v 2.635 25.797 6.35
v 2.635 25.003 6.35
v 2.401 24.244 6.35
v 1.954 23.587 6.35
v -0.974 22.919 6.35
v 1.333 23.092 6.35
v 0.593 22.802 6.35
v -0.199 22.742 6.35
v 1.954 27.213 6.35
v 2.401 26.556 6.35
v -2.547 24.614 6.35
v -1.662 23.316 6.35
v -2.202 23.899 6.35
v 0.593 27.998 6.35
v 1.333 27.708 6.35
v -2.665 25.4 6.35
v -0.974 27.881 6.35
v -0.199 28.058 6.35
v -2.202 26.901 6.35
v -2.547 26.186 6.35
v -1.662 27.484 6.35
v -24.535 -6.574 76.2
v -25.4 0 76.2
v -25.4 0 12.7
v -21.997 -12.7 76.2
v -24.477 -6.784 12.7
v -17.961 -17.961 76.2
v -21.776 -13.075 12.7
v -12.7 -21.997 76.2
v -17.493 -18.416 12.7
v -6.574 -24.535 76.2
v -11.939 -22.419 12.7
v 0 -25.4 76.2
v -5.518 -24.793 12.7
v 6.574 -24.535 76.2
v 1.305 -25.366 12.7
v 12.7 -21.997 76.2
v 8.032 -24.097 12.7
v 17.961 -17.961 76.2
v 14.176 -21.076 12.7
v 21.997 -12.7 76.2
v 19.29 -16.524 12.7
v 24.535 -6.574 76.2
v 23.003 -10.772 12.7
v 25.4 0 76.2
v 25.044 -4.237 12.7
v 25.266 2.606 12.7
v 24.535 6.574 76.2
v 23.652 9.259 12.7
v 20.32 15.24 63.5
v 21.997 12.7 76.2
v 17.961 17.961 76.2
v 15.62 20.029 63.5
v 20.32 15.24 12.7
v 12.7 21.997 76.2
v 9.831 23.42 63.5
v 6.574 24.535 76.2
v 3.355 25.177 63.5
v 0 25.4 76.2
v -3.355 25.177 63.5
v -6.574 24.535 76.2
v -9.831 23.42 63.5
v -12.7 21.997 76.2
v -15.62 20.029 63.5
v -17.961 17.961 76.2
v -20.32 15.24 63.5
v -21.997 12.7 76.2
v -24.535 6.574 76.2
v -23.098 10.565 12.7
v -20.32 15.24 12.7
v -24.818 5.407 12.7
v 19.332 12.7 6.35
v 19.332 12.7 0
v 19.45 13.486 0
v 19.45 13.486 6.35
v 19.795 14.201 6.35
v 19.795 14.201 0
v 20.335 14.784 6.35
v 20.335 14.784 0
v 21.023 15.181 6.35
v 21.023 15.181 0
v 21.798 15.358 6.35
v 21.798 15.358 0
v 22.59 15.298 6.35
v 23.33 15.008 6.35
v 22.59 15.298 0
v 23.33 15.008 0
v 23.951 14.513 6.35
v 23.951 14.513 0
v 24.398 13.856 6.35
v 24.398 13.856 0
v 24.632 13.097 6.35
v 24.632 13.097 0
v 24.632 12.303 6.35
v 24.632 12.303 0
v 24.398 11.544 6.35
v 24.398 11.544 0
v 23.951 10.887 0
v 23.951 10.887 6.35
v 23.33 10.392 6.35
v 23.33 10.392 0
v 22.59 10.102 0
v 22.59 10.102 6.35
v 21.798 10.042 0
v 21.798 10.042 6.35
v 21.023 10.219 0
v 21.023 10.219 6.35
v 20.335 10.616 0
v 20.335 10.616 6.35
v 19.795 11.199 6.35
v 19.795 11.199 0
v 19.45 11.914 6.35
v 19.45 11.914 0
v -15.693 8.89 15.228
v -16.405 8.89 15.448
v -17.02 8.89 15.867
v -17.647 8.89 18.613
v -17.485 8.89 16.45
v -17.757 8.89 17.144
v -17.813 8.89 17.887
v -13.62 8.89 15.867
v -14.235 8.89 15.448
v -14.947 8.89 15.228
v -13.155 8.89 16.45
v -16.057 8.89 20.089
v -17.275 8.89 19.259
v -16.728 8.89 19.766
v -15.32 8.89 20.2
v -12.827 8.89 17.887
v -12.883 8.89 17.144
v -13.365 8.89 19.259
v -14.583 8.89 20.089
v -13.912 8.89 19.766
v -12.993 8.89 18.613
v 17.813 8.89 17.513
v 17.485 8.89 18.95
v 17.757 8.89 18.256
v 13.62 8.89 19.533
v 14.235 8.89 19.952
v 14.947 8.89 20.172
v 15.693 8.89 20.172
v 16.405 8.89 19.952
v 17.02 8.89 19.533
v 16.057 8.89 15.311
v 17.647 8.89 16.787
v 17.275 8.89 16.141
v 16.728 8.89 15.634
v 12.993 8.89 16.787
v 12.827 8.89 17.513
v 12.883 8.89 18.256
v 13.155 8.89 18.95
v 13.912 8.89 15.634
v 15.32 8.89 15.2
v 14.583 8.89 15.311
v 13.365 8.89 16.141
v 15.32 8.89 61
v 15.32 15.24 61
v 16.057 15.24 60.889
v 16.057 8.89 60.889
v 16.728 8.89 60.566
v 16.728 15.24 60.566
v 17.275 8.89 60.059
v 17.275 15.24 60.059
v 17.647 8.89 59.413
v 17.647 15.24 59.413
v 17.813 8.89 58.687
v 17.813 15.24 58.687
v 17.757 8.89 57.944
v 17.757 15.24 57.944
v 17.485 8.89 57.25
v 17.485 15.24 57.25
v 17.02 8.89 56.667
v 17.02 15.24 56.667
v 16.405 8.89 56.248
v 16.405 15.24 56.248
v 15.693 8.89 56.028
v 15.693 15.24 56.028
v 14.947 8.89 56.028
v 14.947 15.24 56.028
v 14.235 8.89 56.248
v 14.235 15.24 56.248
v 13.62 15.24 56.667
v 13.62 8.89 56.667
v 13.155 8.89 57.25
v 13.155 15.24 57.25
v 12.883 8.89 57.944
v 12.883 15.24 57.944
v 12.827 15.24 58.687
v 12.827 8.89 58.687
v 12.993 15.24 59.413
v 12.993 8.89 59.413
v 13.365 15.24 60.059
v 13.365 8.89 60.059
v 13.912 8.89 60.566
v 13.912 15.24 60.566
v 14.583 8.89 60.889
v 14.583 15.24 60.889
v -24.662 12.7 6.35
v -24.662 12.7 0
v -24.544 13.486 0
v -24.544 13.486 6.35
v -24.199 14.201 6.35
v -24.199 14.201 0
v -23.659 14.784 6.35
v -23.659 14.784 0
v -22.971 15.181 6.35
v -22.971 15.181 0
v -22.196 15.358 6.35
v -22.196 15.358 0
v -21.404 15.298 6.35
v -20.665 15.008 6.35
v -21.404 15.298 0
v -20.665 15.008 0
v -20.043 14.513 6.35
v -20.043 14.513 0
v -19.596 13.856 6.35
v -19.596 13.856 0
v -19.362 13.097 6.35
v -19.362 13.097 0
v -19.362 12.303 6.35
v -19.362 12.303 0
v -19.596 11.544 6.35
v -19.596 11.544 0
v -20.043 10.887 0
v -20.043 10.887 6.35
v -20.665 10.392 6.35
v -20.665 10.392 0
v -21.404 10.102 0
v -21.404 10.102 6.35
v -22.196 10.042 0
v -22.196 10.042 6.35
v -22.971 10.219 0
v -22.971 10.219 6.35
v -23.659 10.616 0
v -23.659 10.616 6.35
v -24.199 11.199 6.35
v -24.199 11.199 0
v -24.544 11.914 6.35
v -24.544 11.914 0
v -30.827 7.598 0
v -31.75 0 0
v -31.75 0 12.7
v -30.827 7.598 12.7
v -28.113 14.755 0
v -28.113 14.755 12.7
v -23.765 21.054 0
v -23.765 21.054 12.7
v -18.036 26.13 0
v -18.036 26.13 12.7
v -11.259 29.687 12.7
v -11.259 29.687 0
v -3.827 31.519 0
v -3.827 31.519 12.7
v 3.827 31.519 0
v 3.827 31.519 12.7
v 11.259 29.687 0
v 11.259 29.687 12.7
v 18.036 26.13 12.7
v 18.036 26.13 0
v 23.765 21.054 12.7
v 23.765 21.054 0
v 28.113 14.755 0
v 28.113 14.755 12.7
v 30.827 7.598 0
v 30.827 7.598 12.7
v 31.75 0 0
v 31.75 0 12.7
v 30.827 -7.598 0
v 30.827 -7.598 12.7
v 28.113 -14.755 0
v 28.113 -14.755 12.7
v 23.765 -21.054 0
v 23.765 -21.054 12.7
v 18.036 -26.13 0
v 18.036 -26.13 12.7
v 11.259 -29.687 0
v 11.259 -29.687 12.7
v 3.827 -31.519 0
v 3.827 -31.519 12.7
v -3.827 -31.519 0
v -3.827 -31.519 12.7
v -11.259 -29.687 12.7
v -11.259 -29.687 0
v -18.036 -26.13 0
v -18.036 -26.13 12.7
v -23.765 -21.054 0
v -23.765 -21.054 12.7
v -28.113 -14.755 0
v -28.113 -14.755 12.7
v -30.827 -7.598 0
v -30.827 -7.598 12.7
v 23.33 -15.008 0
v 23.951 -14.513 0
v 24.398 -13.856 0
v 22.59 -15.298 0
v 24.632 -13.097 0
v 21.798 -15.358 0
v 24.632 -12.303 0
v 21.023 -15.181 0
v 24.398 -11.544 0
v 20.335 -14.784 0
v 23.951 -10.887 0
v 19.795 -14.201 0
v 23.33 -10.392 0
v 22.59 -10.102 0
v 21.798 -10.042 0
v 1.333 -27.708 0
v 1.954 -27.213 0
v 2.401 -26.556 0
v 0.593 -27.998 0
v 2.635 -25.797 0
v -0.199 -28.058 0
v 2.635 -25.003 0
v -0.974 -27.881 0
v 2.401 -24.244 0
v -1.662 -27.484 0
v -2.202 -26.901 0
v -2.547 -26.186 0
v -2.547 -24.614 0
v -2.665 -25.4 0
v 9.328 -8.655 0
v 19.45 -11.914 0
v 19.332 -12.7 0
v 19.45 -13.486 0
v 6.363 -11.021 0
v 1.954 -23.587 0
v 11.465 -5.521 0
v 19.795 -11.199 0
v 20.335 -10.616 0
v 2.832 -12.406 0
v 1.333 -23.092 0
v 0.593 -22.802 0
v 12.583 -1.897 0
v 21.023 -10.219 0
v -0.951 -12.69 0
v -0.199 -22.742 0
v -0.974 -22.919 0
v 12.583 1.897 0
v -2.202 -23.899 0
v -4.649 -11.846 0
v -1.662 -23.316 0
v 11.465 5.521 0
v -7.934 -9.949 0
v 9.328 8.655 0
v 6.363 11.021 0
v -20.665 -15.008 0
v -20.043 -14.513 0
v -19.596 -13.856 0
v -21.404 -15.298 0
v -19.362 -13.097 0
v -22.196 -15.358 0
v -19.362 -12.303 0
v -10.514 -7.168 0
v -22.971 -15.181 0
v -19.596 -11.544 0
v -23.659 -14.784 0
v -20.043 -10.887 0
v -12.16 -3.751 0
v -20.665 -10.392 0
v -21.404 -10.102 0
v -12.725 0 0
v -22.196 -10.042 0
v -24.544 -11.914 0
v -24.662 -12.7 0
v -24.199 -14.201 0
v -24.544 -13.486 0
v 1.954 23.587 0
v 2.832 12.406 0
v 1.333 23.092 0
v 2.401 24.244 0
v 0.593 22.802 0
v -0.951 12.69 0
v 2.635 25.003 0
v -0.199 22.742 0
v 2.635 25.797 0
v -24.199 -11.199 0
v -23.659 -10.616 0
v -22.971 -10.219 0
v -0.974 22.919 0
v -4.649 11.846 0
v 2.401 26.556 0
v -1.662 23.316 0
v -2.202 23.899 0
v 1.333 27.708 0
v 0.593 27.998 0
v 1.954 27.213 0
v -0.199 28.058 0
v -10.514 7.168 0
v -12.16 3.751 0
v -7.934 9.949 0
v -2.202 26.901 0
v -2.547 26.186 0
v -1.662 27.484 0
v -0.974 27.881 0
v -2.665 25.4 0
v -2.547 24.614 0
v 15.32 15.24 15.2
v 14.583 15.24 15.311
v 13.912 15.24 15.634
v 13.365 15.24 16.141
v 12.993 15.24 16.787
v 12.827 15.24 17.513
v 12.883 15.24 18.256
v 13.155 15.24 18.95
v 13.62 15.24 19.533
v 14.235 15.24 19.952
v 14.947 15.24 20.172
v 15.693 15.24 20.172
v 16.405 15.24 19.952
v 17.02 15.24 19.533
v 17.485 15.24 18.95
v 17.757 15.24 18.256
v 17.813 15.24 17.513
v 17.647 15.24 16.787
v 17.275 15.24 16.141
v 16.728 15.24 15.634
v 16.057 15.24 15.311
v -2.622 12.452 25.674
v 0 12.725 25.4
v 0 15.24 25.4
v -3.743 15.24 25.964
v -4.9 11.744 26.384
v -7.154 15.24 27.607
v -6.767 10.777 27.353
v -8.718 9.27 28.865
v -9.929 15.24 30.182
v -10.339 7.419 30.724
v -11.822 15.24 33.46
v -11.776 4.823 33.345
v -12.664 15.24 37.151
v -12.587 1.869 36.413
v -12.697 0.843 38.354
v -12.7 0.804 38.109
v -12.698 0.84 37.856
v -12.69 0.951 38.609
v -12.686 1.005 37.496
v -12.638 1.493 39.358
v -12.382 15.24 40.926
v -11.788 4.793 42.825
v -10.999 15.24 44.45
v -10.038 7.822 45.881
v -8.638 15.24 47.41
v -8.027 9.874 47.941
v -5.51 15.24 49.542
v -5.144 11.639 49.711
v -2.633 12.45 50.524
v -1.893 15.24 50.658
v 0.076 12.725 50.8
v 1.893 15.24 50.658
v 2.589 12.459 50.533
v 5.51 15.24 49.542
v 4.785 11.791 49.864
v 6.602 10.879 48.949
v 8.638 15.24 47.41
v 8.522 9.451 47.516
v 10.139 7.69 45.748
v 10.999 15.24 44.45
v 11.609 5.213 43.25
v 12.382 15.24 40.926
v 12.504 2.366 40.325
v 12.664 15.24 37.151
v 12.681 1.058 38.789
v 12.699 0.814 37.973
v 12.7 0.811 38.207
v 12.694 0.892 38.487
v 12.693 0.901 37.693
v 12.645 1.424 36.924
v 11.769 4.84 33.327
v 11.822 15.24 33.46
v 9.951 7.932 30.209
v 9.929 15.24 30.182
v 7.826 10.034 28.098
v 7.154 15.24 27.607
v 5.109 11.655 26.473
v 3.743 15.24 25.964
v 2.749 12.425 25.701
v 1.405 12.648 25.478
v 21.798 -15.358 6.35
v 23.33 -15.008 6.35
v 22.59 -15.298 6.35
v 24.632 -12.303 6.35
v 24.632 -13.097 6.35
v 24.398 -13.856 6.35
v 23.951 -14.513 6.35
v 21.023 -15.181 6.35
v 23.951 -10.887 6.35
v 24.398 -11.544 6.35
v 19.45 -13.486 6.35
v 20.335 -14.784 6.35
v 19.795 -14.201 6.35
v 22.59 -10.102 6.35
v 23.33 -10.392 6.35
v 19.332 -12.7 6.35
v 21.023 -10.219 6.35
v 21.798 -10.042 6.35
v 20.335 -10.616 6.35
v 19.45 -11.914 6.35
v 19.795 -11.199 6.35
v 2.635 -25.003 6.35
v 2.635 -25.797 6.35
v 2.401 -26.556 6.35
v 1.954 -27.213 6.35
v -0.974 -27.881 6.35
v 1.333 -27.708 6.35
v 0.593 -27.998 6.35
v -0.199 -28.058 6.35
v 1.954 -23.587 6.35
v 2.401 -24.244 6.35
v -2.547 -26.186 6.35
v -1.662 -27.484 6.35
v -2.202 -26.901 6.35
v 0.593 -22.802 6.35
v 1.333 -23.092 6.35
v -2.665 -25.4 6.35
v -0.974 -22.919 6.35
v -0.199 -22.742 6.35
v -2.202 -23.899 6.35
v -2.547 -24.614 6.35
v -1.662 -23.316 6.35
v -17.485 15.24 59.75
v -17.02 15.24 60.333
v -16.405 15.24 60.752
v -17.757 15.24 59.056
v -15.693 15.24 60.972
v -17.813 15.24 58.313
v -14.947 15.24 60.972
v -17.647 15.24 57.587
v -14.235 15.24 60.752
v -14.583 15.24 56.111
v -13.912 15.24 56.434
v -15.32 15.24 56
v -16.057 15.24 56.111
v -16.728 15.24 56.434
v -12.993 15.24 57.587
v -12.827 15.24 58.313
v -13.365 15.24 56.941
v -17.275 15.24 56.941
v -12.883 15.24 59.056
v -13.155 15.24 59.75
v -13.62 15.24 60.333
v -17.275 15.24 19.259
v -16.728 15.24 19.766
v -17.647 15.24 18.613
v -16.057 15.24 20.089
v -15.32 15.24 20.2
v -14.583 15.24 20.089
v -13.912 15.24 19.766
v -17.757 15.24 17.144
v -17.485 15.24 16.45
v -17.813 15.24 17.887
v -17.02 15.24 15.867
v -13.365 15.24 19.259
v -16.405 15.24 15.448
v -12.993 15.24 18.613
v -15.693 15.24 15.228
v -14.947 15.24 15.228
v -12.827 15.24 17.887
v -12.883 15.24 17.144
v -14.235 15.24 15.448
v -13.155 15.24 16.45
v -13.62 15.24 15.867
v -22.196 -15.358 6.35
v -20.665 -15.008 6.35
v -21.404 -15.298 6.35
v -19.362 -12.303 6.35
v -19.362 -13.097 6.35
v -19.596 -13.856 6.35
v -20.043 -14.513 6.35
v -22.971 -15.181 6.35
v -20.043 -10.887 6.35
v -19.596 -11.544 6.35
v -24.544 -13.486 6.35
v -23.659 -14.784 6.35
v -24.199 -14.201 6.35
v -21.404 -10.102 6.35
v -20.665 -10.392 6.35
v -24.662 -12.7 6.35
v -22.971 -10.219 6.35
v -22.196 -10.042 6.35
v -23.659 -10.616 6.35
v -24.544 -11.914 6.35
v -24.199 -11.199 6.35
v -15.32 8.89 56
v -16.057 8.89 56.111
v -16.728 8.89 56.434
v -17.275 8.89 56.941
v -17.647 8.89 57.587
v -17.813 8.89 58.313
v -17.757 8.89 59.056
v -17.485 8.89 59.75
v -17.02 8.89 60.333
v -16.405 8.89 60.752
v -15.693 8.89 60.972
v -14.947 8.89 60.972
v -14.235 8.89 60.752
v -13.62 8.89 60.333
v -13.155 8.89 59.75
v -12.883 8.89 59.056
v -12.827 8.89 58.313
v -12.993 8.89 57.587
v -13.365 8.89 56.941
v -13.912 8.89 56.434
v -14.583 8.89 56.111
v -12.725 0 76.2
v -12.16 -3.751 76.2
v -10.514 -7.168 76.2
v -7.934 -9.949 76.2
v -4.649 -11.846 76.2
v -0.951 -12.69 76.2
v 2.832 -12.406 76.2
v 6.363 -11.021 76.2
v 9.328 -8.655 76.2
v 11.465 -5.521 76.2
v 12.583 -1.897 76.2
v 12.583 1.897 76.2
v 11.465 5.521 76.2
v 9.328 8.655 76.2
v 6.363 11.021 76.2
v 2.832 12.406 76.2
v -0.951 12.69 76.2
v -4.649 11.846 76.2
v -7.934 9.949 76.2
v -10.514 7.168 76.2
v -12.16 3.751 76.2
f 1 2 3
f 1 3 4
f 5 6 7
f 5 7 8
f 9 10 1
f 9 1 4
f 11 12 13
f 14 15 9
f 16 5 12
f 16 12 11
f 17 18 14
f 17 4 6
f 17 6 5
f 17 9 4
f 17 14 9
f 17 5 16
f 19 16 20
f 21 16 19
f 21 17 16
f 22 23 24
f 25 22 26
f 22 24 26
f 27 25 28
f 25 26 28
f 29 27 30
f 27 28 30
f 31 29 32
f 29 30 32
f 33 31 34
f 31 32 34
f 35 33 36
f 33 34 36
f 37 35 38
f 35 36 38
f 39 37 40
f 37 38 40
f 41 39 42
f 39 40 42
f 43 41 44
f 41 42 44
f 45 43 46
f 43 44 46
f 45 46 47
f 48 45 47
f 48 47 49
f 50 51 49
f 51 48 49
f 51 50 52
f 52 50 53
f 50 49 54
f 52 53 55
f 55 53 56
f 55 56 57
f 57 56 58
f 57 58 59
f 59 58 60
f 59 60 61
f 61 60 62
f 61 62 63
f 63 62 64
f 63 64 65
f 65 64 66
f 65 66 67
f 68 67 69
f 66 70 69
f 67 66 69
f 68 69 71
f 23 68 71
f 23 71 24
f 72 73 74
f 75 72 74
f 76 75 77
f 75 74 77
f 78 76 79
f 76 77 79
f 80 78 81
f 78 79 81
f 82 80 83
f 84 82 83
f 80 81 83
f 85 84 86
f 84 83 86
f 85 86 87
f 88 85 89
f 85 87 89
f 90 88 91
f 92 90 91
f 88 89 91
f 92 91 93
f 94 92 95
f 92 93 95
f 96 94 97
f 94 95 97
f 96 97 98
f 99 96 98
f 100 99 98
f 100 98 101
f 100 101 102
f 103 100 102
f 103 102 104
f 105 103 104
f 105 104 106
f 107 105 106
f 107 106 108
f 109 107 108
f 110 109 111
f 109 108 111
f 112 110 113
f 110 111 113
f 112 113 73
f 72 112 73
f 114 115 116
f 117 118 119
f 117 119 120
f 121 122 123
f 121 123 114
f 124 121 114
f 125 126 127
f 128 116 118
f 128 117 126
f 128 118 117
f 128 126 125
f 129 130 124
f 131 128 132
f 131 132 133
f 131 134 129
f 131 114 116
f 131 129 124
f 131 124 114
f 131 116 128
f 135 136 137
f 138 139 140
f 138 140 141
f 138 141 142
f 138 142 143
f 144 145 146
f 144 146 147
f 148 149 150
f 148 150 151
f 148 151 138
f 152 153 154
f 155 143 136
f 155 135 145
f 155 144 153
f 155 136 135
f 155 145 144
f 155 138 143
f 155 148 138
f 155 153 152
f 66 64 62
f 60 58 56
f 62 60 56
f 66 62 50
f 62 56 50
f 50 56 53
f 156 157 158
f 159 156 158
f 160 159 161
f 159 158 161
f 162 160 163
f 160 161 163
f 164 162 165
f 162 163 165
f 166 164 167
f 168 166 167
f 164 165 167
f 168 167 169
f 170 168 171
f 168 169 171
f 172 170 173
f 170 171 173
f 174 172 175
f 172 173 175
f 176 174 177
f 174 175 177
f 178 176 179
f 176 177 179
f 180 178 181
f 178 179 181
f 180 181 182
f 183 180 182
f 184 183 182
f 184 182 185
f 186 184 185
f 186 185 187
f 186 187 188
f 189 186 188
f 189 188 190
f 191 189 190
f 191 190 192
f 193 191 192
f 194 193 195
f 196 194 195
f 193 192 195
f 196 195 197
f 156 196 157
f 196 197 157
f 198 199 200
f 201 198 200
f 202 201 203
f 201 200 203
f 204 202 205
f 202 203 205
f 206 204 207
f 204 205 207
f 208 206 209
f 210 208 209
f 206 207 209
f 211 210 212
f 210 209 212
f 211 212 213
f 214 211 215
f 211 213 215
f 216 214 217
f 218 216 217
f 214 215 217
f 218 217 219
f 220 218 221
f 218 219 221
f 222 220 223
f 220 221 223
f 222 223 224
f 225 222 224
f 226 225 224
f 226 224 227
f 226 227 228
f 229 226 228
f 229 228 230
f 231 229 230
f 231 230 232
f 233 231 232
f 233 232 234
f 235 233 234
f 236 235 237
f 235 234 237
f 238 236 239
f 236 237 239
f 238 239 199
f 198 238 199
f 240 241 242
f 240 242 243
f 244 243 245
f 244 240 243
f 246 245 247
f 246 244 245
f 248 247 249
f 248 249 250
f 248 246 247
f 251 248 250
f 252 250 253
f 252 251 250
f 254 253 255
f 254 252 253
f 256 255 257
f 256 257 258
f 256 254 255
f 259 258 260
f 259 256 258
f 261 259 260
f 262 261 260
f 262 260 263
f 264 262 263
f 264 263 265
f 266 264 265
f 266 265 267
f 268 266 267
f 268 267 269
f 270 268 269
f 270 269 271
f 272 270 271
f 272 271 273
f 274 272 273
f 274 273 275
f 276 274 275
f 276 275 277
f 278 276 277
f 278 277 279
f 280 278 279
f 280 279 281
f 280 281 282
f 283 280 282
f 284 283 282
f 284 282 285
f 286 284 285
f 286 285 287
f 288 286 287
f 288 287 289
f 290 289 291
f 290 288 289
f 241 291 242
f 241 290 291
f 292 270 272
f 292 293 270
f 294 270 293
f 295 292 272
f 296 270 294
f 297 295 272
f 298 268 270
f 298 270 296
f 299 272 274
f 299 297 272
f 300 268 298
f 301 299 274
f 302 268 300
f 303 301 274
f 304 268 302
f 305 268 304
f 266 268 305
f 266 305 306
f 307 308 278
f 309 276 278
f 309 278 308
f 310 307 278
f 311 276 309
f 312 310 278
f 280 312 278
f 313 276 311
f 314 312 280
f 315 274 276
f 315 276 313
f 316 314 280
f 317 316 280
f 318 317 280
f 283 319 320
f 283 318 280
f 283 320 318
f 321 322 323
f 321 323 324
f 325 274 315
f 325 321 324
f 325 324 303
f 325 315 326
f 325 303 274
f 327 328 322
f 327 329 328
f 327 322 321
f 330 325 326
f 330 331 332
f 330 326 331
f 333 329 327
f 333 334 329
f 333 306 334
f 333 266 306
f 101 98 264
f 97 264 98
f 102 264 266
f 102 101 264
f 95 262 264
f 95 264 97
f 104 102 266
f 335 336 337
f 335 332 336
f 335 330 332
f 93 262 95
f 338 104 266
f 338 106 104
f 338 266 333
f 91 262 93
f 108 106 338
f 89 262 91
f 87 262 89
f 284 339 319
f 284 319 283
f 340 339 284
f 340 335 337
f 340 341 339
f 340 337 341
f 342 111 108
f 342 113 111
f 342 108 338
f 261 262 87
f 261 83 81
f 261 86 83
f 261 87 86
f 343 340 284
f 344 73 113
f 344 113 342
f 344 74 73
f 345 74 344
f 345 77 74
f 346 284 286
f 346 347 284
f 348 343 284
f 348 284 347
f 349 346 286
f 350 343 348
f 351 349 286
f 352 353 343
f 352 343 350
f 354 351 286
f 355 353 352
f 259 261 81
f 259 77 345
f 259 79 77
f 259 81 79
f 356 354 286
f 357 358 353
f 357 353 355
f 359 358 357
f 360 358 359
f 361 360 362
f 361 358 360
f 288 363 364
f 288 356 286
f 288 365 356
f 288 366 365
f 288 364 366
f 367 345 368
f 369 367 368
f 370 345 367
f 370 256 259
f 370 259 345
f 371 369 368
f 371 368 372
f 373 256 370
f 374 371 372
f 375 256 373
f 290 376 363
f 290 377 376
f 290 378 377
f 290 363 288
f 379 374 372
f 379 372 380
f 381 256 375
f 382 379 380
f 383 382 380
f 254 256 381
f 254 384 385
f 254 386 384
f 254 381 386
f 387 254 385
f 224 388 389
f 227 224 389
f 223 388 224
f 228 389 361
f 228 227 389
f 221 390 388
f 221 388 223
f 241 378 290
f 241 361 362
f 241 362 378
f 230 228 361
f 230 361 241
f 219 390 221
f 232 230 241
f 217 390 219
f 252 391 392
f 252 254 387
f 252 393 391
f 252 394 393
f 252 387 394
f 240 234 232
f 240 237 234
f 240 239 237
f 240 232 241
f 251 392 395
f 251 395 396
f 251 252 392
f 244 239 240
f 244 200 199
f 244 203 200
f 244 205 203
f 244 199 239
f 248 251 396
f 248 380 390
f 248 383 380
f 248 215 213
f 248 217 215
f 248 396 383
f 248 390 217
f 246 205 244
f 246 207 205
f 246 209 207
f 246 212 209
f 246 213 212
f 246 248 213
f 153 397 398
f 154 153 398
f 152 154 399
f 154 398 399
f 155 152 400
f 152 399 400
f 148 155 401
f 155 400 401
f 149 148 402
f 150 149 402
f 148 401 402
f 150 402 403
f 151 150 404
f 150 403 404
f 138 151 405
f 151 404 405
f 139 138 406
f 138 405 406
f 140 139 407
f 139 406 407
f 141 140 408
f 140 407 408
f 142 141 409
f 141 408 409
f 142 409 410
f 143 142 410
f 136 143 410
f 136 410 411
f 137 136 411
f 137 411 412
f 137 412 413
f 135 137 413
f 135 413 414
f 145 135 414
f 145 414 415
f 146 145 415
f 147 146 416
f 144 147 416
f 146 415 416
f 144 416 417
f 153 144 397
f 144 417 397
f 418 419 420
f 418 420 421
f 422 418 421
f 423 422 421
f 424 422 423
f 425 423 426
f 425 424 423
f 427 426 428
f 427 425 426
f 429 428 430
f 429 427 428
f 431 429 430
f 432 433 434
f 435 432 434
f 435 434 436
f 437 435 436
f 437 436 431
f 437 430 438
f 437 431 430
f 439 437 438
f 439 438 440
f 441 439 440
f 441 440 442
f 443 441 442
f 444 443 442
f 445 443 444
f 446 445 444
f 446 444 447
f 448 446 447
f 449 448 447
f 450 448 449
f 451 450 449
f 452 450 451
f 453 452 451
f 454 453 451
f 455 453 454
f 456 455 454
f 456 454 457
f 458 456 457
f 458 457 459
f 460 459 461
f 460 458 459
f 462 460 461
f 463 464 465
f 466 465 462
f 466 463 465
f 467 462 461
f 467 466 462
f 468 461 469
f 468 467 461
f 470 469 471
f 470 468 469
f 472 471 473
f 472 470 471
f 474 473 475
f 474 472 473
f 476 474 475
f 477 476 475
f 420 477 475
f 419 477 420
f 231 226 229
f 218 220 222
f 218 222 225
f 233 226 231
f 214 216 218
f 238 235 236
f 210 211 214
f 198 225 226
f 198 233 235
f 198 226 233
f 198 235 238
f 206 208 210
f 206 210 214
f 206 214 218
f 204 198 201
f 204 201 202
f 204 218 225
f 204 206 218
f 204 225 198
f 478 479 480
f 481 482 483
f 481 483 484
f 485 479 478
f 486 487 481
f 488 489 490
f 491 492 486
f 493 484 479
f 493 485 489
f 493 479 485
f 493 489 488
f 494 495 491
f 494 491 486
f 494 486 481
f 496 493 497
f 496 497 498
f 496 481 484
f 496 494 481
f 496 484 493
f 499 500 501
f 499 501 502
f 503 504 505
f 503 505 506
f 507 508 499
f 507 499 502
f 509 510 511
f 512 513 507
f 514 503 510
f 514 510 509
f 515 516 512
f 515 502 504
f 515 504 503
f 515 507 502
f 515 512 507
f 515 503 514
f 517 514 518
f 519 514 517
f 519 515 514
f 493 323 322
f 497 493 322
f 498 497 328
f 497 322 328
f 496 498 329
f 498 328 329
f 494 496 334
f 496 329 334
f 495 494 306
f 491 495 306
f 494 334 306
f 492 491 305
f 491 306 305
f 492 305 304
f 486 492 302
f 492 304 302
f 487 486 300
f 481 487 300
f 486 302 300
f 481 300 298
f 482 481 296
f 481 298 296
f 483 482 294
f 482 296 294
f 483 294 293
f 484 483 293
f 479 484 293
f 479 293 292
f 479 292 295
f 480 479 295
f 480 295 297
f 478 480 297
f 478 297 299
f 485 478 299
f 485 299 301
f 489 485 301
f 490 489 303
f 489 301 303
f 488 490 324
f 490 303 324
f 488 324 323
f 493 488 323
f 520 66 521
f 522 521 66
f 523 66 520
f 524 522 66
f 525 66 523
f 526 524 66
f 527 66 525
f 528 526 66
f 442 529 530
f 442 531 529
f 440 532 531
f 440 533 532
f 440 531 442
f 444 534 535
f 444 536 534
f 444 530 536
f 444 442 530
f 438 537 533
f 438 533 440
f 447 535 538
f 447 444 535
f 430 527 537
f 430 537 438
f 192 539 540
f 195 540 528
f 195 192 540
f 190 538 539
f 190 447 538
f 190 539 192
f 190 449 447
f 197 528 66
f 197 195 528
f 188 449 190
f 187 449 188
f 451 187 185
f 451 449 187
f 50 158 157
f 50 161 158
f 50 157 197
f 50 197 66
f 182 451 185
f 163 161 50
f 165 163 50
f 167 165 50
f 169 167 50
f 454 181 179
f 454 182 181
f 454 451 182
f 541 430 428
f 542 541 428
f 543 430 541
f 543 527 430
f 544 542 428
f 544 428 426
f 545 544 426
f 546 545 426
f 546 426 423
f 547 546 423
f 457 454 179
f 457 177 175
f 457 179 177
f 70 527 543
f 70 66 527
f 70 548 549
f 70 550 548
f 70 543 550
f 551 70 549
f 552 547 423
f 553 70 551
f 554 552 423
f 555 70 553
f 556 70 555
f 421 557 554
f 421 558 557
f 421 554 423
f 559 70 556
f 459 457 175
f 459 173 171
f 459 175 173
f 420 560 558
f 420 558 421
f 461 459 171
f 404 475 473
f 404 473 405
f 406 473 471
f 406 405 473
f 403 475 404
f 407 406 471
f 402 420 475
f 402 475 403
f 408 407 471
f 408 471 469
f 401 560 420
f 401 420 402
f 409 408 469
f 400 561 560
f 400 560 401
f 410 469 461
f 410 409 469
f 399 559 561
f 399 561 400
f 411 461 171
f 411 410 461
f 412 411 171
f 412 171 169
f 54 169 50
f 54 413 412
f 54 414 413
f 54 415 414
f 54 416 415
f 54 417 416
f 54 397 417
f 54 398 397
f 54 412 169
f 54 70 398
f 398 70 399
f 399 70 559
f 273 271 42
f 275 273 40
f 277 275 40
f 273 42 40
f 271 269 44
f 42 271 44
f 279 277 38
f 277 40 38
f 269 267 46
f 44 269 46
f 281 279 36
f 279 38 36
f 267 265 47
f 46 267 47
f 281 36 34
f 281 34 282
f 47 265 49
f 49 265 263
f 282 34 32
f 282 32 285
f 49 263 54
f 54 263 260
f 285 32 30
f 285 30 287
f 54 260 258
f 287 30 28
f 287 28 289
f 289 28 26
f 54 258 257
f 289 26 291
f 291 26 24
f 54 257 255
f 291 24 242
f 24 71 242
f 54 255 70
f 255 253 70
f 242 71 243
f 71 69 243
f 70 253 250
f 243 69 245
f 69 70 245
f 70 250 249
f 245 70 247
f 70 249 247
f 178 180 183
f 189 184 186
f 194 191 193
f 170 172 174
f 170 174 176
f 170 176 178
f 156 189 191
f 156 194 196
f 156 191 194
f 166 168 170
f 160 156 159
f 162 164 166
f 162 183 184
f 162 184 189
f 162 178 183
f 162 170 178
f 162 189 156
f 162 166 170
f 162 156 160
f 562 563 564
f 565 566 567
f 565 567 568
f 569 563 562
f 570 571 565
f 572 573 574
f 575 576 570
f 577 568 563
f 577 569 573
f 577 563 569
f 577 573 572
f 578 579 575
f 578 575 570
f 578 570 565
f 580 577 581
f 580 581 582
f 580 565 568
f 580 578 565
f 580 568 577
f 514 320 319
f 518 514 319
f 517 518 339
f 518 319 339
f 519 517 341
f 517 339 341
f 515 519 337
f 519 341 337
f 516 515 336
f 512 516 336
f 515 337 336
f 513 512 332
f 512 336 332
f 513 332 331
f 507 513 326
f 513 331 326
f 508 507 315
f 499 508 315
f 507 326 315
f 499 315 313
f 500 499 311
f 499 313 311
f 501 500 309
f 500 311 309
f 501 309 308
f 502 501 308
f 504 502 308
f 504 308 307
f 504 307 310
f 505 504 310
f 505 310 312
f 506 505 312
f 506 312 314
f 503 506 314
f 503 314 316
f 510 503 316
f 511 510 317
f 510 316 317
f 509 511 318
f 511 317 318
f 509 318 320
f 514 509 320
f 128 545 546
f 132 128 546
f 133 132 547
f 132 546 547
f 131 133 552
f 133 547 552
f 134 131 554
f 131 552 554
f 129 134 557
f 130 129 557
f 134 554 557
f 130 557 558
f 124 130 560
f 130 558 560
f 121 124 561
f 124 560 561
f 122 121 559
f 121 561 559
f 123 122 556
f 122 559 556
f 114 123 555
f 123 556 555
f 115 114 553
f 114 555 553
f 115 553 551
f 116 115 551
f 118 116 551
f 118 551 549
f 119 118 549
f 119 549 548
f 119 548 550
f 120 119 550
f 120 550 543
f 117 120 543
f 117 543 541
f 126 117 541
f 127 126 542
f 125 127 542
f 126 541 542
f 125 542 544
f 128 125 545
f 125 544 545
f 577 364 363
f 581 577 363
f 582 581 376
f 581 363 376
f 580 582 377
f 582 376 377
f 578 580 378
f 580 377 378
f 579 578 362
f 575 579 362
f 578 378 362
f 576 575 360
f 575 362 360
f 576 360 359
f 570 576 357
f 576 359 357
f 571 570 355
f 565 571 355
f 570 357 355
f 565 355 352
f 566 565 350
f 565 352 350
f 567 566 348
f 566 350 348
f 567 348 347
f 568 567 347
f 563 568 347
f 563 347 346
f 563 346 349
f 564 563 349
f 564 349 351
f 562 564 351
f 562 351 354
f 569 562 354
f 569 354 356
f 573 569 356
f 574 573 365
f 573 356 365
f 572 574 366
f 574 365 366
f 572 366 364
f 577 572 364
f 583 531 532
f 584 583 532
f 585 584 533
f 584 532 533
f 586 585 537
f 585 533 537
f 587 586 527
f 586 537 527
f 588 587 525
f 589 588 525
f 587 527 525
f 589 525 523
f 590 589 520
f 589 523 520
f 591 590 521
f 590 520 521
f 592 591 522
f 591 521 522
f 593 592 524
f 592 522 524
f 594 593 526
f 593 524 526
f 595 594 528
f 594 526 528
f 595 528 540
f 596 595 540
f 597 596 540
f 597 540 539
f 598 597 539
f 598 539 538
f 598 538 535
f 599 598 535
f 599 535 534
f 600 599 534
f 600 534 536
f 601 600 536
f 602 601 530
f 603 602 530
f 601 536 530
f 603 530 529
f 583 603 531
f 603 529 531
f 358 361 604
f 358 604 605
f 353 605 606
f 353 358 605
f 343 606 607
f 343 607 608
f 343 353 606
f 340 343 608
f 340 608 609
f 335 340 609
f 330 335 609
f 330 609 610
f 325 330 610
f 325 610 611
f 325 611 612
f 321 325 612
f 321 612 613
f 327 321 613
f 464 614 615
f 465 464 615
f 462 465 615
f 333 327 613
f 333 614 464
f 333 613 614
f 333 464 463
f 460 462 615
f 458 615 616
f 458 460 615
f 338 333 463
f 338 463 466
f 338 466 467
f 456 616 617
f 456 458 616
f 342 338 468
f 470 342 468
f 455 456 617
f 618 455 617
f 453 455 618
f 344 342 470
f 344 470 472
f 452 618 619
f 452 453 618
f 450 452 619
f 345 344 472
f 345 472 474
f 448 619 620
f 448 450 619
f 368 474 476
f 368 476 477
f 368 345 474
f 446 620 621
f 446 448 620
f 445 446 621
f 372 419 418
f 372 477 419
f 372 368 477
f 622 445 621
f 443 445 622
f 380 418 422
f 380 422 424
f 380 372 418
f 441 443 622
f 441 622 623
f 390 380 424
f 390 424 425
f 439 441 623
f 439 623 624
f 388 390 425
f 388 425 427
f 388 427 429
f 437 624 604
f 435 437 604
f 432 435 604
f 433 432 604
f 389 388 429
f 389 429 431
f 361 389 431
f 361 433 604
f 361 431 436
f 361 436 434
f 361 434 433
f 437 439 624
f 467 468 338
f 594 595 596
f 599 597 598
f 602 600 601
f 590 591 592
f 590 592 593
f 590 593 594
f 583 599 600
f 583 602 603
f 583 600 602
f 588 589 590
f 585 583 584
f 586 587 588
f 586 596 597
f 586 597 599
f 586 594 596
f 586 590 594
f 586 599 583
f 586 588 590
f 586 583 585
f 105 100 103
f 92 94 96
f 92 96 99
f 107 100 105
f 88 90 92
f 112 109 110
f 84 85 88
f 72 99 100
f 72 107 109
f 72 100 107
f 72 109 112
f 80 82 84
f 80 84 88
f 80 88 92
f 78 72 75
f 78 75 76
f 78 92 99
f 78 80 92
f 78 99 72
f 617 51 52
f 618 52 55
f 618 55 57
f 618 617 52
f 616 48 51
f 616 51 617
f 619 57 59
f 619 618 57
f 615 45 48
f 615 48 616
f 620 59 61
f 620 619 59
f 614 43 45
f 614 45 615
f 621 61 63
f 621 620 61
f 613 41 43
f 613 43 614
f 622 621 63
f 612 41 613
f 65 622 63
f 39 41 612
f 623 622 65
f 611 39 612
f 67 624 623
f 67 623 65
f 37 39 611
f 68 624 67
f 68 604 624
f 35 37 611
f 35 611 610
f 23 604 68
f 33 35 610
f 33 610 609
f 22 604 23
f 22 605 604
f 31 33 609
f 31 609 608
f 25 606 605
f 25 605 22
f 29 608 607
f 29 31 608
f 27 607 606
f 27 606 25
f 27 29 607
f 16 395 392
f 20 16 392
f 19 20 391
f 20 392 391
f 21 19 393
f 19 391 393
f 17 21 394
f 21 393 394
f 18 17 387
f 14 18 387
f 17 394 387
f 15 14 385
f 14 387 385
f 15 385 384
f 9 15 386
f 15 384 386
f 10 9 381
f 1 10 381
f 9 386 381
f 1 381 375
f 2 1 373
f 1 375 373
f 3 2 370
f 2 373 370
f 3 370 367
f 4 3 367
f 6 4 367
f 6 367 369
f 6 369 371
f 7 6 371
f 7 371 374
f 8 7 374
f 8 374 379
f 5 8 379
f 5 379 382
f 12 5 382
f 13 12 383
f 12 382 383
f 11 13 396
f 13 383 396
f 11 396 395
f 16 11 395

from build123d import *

# Parameters (mm, degrees)
SKETCH1_R               = 25.4
SKETCH1_R_2             = 12.7254
BOSS_EXTRUDE1_DEPTH     = 76.2
SKETCH3_R               = 31.75
SKETCH3_R_2             = 12.7254
BOSS_EXTRUDE2_DEPTH     = 12.7
CUT_EXTRUDE3_REACH      = 90.445
CUT_EXTRUDE3_END_RADIUS = 25.4
SKETCH2_R               = 12.7
SKETCH5_W               = 50.8
SKETCH5_H               = 50.8
CUT_EXTRUDE4_DEPTH      = 10.16
SKETCH7_R               = 2.665
CUT_EXTRUDE6_DEPTH      = 6.35
SKETCH8_R               = 2.5
CUT_EXTRUDE7_DEPTH      = 6.35


with BuildPart() as part:
    # Sketch1 → Boss-Extrude1 (new body)
    with BuildSketch(Plane.XY):
        with Locations(Location((0, 0, 0), (0, 0, 180))):
            Circle(SKETCH1_R)
        with Locations(Location((0, 0, 0), (0, 0, 180))):
            Circle(SKETCH1_R_2, mode=Mode.SUBTRACT)
    extrude(amount=BOSS_EXTRUDE1_DEPTH)

    # Sketch3 → Boss-Extrude2 (add)
    with BuildSketch(Plane(origin=(0, 0, 0), x_dir=(-1, 0, 0), z_dir=(0, 0, -1))):
        Circle(SKETCH3_R)
        Circle(SKETCH3_R_2, mode=Mode.SUBTRACT)
    extrude(amount=-BOSS_EXTRUDE2_DEPTH)

    # Cut-Extrude3: up to this cylinder (the profile starts inside it)
    cut_extrude3_end = Plane(origin=(0, 0, 38.1), z_dir=(0, 0, -1)) * Cylinder(CUT_EXTRUDE3_END_RADIUS, 232.69, mode=Mode.PRIVATE)
    # Sketch2 → Cut-Extrude3 (cut, up to the surface)
    with BuildSketch(Plane(origin=(0, 0, 0), x_dir=(1, 0, 0), z_dir=(0, 1, 0)), mode=Mode.PRIVATE) as cut_extrude3_sk1:
        with Locations(Location((0, -38.1, 0), (0, 0, 90))):
            Circle(SKETCH2_R)
    cut_extrude3_tool1 = extrude(cut_extrude3_sk1.sketch, amount=CUT_EXTRUDE3_REACH, mode=Mode.PRIVATE) & cut_extrude3_end
    add(cut_extrude3_tool1.solids().sort_by_distance((0, 0, 38.1))[0], mode=Mode.SUBTRACT)

    # Sketch5 → Cut-Extrude4 (cut)
    with BuildSketch(Plane(origin=(0, 25.4, 0), x_dir=(1, 0, 0), z_dir=(0, 1, 0))):
        with Locations((0, -38.1)):
            Rectangle(SKETCH5_W, SKETCH5_H)
    extrude(amount=-CUT_EXTRUDE4_DEPTH, mode=Mode.SUBTRACT)

    # Sketch7 → Cut-Extrude6 (cut)
    with BuildSketch(Plane(origin=(0, 0, 0), x_dir=(-1, 0, 0), z_dir=(0, 0, -1))):
        with Locations((0, 25.4)):
            Circle(SKETCH7_R)
        with Locations((21.997045256, 12.7)):
            Circle(SKETCH7_R)
        with Locations((21.997045256, -12.7)):
            Circle(SKETCH7_R)
        with Locations((0, -25.4)):
            Circle(SKETCH7_R)
        with Locations((-21.997045256, -12.7)):
            Circle(SKETCH7_R)
        with Locations((-21.997045256, 12.7)):
            Circle(SKETCH7_R)
    extrude(amount=-CUT_EXTRUDE6_DEPTH, mode=Mode.SUBTRACT)

    # Sketch8 → Cut-Extrude7 (cut)
    with BuildSketch(Plane(origin=(0, 15.24, 0), x_dir=(1, 0, 0), z_dir=(0, 1, 0))):
        with Locations(Location((-15.32, -17.7, 0), (0, 0, 270))):
            Circle(SKETCH8_R)
        with Locations(Location((15.32, -17.7, 0), (0, 0, 90))):
            Circle(SKETCH8_R)
        with Locations(Location((-15.32, -58.5, 0), (0, 0, 90))):
            Circle(SKETCH8_R)
        with Locations(Location((15.32, -58.5, 0), (0, 0, 270))):
            Circle(SKETCH8_R)
    extrude(amount=-CUT_EXTRUDE7_DEPTH, mode=Mode.SUBTRACT)


solid = part.part
